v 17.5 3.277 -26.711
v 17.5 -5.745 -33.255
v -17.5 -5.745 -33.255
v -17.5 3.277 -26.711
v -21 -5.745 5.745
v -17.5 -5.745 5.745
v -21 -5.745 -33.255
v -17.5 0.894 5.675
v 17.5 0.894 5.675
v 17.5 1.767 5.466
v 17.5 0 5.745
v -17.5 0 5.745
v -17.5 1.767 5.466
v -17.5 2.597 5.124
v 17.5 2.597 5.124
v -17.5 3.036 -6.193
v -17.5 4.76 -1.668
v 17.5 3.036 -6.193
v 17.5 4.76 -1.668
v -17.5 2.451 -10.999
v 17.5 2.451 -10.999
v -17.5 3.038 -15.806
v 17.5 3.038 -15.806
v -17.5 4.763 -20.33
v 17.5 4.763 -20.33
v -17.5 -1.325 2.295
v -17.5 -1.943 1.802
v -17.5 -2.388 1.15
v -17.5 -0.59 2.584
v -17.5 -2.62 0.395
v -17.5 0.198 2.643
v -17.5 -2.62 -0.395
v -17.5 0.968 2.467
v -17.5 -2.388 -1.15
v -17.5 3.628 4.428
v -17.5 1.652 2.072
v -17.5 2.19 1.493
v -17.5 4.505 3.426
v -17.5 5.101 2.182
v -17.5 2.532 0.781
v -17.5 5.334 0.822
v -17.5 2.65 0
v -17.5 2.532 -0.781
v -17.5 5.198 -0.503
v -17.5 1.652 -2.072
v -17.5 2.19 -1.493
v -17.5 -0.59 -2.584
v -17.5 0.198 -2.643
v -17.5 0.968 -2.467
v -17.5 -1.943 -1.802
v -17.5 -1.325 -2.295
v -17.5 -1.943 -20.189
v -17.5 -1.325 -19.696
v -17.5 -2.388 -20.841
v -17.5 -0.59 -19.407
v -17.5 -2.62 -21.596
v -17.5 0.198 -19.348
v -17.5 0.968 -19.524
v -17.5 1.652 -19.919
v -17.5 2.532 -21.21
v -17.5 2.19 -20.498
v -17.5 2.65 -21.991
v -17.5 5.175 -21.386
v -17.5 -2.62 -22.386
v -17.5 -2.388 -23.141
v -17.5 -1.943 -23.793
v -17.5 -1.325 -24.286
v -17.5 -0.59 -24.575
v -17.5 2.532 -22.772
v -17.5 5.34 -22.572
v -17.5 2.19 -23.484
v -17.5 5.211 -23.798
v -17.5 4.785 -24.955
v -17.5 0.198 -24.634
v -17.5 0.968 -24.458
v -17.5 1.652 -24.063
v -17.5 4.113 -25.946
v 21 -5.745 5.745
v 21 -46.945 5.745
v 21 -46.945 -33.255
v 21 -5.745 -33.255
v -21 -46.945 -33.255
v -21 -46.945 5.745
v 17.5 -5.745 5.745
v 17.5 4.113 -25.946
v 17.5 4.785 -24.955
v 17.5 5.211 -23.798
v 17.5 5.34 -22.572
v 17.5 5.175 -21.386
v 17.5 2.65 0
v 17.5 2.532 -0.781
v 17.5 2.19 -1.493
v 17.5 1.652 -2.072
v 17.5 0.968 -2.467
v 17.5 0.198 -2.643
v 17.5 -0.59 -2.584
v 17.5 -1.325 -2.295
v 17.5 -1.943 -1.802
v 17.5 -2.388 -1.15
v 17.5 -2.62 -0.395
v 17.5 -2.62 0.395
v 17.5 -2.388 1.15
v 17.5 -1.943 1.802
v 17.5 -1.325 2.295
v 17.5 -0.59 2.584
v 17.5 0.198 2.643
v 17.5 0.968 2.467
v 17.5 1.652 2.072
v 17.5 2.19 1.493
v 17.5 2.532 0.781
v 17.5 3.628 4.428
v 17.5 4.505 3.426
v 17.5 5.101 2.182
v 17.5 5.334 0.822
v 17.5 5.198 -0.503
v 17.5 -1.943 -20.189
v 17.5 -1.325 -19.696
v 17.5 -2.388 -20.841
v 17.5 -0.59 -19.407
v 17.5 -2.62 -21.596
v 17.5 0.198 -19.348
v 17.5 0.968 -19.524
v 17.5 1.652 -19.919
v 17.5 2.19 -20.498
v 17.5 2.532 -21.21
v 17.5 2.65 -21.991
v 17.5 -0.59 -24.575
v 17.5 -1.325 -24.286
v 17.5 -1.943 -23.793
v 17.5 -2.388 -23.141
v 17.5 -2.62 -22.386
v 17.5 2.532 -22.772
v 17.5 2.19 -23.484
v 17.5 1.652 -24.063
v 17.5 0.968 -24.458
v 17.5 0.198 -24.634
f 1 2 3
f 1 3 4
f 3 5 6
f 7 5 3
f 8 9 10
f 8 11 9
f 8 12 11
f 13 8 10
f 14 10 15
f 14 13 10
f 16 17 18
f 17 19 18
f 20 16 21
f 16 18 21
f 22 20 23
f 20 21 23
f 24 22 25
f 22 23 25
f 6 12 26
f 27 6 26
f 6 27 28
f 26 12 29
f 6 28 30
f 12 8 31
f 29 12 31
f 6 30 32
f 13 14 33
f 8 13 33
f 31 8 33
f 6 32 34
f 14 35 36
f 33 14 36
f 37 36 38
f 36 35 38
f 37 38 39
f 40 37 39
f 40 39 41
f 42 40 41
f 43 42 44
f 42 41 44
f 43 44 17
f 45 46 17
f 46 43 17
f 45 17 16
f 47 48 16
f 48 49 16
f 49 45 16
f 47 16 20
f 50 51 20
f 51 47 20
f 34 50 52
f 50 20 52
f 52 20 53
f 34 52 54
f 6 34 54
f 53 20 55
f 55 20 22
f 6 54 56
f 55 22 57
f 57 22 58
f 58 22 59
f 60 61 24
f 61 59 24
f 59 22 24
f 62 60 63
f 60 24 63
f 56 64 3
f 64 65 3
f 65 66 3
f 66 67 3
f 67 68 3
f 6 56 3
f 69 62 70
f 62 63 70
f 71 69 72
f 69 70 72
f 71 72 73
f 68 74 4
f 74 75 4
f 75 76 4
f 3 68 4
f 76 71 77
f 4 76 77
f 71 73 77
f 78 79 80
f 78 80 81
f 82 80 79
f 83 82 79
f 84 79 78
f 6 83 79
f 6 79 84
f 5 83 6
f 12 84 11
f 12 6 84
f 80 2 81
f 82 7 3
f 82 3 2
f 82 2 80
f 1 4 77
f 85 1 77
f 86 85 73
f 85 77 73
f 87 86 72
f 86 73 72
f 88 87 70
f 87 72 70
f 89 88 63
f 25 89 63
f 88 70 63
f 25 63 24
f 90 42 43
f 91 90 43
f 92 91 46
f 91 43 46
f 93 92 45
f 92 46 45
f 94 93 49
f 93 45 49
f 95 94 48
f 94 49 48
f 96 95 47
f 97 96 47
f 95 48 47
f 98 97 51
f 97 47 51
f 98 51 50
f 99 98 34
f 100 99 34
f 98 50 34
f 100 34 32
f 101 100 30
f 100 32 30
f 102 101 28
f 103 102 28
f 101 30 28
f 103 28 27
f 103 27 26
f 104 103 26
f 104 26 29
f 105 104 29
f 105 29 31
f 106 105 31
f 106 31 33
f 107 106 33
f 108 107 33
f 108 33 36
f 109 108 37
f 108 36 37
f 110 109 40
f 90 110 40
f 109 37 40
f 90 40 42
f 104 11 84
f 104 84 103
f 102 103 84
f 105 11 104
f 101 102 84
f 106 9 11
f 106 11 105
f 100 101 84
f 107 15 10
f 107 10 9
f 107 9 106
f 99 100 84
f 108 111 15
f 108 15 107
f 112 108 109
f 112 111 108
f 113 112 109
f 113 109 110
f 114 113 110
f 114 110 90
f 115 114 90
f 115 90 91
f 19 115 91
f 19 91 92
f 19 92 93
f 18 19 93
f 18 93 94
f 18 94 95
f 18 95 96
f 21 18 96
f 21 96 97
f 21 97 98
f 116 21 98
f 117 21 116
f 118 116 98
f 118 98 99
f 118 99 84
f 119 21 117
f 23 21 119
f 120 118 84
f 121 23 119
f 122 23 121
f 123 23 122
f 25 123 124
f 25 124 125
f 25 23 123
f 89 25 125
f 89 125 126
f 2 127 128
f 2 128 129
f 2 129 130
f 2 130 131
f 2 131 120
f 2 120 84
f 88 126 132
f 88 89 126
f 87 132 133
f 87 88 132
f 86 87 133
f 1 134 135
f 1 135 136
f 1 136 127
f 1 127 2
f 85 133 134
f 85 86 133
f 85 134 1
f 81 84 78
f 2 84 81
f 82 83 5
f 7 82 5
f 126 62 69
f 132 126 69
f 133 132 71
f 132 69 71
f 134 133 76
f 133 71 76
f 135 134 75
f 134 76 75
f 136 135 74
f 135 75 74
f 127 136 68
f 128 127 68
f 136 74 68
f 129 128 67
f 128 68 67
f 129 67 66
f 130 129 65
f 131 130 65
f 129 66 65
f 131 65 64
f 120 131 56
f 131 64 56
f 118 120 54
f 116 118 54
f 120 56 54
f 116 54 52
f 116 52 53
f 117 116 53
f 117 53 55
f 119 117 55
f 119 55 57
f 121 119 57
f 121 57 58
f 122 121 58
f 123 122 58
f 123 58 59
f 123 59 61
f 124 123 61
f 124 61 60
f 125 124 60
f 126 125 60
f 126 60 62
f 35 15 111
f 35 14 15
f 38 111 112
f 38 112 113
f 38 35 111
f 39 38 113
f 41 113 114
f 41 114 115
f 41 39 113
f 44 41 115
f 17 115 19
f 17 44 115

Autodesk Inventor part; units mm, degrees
ref_plane "YZ Plane" through (0, 0, 0) normal (1, 0, 0) x (0, 1, 0)
ref_plane "XZ Plane" through (0, 0, 0) normal (0, 1, 0) x (-1, 0, 0)
ref_plane "XY Plane" through (0, 0, 0) normal (0, 0, 1) x (1, 0, 0)
sketch "Sketch1" plane through (0, 0, 0) normal (1, 0, 0) x (0, 1, 0)
  circle A0 centre (-9.7574, -19.7073) radius 1.55 construction
  circle A1 centre (0, 0) radius 1.55 construction
  circle A2 centre (-9.7574, -19.7073) radius 2.65
  circle A3 centre (0, 0) radius 2.65
  line L0 (-6.0684, -24.2876) -> (12.7398, 12.1607) construction
  arc A4 (-12.2239, -24.4871) -> (-4.9776, -22.1738) centre (-9.7574, -19.7073) ccw
  circle A5 centre (0, 0) radius 5.7448
  line L1 (-4.9776, -22.1738) -> (5.1052, -2.6344)
  arc A6 (-4.9776, -22.1738) -> (-12.2239, -24.4871) centre (-9.7574, -19.7073) ccw
  line L2 (-14.5372, -17.2408) -> (-5.1904, 2.4623)
  line L3 (0, 0) -> (0, -27.0135) construction
  line L4 (0, 0) -> (-9.7574, -19.7073) construction
  point P0 (-10.1101, -25.5779)
  dimension "d0" = 5.3
  dimension "d1" = 5.3
  dimension "d3" = 11.4897
  dimension "d4" = 5.3787
  dimension "d5" = 21.8076
  dimension "d6" = 21.9875
extrude "Extrusion1" [suppressed]
sketch "Sketch4" plane through (0, 0, 0) normal (1, 0, 0) x (0, 1, 0)
  circle A0 centre (0, 0) radius 2.65 projected
  circle A1 centre (0, 0) radius 5.7448 projected
  line L0 (5.7448, 0) -> (5.7448, -21.991)
  line L1 (0, 0) -> (-9.7574, -19.7073) construction
  line L2 (5.7448, -21.991) -> (0, -21.991) construction
  circle A2 centre (0, -21.991) radius 5.7448
  circle A3 centre (0, -21.991) radius 2.65
  line L3 (-5.7448, -21.991) -> (-5.7448, 0)
  dimension "d22" = 21.991
  dimension "d23" = 21.9905
  dimension "d24" = 5.3
extrude "Extrusion4" add sketch "Sketch4" along normal mid plane 35
sketch "Sketch6" plane through (0, 0, 0) normal (1, 0, 0) x (0, 1, 0)
  line L0 (5.7448, 0) -> (5.7448, -21.991) construction
  arc A0 (-5.7448, -21.991) -> (5.7448, -21.991) centre (0, -21.991) ccw construction
  line L1 (-5.7448, -21.991) -> (-5.7448, 0) construction
  arc A1 (5.7448, 0) -> (-5.7448, 0) centre (0, 0) ccw construction
  circle A2 centre (0, -21.991) radius 2.65 construction
  circle A3 centre (0, 0) radius 2.65 construction
  arc A4 (5.7448, 0) -> (-5.7448, 0) centre (0, 0) ccw construction
  line L2 (0, 0) -> (-5.7448, 0) construction
  line L3 (0, 5.7448) -> (-5.7448, 5.7448) construction
  line L4 (-5.7448, 5.7448) -> (-5.7448, -33.2552) construction
  line L5 (-5.7448, 5.7448) -> (-46.9448, 5.7448) construction
  line L6 (-5.7448, -33.2552) -> (-46.9448, -33.2552)
  line L7 (-46.9448, -33.2552) -> (-46.9448, 5.7448)
  line L8 (-46.9448, 5.7448) -> (-5.7448, 5.7448)
  line L9 (-5.7448, 5.7448) -> (-5.7448, -33.2552)
  dimension "d32" = 39
  dimension "d35" = 41.2
extrude "Extrusion5" add sketch "Sketch6" along normal mid plane 42
sketch "Sketch7" plane through (17.5, 0, 0) normal (1, 0, 0) x (0, 0, -1)
  line L0 (21.991, 5.7448) -> (0, 5.7448) projected
  arc A0 (0, 5.7448) -> (0, -5.7448) centre (0, 0) ccw projected
  line L1 (0, -5.7448) -> (21.991, -5.7448) projected
  arc A1 (21.991, -5.7448) -> (21.991, 5.7448) centre (21.991, 0) ccw projected
  circle A2 centre (21.991, 0) radius 2.65 projected
  circle A3 centre (0, 0) radius 2.65 projected
  line L2 (-5.7448, -46.9448) -> (33.2552, -46.9448) projected
  line L3 (33.2552, -46.9448) -> (33.2552, -5.7448) projected
  line L4 (33.2552, -5.7448) -> (-5.7448, -5.7448) projected
  line L5 (-5.7448, -5.7448) -> (-5.7448, -46.9448) projected
  line L6 (33.2552, -5.7448) -> (26.6413, 3.3732)
  arc A4 (21.991, -5.7448) -> (21.991, 5.7448) centre (21.991, 0) ccw projected
  line L7 (-5.7448, -5.7448) -> (-5.7448, 0)
  arc A5 (0, 5.7448) -> (0, -5.7448) centre (0, 0) ccw projected
  point P0 (26.6413, 3.3732)
  point P1 (0, -5.7448)
extrude "Extrusion6" add sketch "Sketch7" against normal up to surface (35 mm away) contours A1 L1 A0 L0 | L6 L4 A1 | A0 L4 L7
sketch "Sketch8" plane through (17.5, 0, 0) normal (1, 0, 0) x (0, 0, -1)
  line L0 (21.991, 5.7448) -> (0, 5.7448) projected
  arc A0 (0, 5.7448) -> (-5.7448, 0) centre (0, 0) ccw projected
  line L1 (-5.7448, 0) -> (-5.7448, -5.7448) projected
  line L2 (33.2552, -5.7448) -> (-5.7448, -5.7448) projected
  line L3 (33.2552, -5.7448) -> (26.6413, 3.3732) projected
  arc A1 (26.6413, 3.3732) -> (21.991, 5.7448) centre (21.991, 0) ccw projected
  circle A2 centre (21.991, 0) radius 2.65 projected
  circle A3 centre (0, 0) radius 2.65 projected
  line L4 (0, 5.7448) -> (21.991, 5.7448) projected
  arc A4 (26.6413, 3.3732) -> (21.991, 5.7448) centre (21.991, 0) ccw projected
  arc A5 (0, 5.7448) -> (21.991, 5.7448) centre (10.9955, 22.4511) ccw
  dimension "d39" = 20
extrude "Extrusion7" cut sketch "Sketch8" against normal up to next contours A5 L0
fillet "Fillet1" radius 5 2 edges at (0, 5.7448, -21.991) (0, 5.7448, 0)
properties part number "Kauri modular session 5 mount" material "Brass, Soft Yellow"
